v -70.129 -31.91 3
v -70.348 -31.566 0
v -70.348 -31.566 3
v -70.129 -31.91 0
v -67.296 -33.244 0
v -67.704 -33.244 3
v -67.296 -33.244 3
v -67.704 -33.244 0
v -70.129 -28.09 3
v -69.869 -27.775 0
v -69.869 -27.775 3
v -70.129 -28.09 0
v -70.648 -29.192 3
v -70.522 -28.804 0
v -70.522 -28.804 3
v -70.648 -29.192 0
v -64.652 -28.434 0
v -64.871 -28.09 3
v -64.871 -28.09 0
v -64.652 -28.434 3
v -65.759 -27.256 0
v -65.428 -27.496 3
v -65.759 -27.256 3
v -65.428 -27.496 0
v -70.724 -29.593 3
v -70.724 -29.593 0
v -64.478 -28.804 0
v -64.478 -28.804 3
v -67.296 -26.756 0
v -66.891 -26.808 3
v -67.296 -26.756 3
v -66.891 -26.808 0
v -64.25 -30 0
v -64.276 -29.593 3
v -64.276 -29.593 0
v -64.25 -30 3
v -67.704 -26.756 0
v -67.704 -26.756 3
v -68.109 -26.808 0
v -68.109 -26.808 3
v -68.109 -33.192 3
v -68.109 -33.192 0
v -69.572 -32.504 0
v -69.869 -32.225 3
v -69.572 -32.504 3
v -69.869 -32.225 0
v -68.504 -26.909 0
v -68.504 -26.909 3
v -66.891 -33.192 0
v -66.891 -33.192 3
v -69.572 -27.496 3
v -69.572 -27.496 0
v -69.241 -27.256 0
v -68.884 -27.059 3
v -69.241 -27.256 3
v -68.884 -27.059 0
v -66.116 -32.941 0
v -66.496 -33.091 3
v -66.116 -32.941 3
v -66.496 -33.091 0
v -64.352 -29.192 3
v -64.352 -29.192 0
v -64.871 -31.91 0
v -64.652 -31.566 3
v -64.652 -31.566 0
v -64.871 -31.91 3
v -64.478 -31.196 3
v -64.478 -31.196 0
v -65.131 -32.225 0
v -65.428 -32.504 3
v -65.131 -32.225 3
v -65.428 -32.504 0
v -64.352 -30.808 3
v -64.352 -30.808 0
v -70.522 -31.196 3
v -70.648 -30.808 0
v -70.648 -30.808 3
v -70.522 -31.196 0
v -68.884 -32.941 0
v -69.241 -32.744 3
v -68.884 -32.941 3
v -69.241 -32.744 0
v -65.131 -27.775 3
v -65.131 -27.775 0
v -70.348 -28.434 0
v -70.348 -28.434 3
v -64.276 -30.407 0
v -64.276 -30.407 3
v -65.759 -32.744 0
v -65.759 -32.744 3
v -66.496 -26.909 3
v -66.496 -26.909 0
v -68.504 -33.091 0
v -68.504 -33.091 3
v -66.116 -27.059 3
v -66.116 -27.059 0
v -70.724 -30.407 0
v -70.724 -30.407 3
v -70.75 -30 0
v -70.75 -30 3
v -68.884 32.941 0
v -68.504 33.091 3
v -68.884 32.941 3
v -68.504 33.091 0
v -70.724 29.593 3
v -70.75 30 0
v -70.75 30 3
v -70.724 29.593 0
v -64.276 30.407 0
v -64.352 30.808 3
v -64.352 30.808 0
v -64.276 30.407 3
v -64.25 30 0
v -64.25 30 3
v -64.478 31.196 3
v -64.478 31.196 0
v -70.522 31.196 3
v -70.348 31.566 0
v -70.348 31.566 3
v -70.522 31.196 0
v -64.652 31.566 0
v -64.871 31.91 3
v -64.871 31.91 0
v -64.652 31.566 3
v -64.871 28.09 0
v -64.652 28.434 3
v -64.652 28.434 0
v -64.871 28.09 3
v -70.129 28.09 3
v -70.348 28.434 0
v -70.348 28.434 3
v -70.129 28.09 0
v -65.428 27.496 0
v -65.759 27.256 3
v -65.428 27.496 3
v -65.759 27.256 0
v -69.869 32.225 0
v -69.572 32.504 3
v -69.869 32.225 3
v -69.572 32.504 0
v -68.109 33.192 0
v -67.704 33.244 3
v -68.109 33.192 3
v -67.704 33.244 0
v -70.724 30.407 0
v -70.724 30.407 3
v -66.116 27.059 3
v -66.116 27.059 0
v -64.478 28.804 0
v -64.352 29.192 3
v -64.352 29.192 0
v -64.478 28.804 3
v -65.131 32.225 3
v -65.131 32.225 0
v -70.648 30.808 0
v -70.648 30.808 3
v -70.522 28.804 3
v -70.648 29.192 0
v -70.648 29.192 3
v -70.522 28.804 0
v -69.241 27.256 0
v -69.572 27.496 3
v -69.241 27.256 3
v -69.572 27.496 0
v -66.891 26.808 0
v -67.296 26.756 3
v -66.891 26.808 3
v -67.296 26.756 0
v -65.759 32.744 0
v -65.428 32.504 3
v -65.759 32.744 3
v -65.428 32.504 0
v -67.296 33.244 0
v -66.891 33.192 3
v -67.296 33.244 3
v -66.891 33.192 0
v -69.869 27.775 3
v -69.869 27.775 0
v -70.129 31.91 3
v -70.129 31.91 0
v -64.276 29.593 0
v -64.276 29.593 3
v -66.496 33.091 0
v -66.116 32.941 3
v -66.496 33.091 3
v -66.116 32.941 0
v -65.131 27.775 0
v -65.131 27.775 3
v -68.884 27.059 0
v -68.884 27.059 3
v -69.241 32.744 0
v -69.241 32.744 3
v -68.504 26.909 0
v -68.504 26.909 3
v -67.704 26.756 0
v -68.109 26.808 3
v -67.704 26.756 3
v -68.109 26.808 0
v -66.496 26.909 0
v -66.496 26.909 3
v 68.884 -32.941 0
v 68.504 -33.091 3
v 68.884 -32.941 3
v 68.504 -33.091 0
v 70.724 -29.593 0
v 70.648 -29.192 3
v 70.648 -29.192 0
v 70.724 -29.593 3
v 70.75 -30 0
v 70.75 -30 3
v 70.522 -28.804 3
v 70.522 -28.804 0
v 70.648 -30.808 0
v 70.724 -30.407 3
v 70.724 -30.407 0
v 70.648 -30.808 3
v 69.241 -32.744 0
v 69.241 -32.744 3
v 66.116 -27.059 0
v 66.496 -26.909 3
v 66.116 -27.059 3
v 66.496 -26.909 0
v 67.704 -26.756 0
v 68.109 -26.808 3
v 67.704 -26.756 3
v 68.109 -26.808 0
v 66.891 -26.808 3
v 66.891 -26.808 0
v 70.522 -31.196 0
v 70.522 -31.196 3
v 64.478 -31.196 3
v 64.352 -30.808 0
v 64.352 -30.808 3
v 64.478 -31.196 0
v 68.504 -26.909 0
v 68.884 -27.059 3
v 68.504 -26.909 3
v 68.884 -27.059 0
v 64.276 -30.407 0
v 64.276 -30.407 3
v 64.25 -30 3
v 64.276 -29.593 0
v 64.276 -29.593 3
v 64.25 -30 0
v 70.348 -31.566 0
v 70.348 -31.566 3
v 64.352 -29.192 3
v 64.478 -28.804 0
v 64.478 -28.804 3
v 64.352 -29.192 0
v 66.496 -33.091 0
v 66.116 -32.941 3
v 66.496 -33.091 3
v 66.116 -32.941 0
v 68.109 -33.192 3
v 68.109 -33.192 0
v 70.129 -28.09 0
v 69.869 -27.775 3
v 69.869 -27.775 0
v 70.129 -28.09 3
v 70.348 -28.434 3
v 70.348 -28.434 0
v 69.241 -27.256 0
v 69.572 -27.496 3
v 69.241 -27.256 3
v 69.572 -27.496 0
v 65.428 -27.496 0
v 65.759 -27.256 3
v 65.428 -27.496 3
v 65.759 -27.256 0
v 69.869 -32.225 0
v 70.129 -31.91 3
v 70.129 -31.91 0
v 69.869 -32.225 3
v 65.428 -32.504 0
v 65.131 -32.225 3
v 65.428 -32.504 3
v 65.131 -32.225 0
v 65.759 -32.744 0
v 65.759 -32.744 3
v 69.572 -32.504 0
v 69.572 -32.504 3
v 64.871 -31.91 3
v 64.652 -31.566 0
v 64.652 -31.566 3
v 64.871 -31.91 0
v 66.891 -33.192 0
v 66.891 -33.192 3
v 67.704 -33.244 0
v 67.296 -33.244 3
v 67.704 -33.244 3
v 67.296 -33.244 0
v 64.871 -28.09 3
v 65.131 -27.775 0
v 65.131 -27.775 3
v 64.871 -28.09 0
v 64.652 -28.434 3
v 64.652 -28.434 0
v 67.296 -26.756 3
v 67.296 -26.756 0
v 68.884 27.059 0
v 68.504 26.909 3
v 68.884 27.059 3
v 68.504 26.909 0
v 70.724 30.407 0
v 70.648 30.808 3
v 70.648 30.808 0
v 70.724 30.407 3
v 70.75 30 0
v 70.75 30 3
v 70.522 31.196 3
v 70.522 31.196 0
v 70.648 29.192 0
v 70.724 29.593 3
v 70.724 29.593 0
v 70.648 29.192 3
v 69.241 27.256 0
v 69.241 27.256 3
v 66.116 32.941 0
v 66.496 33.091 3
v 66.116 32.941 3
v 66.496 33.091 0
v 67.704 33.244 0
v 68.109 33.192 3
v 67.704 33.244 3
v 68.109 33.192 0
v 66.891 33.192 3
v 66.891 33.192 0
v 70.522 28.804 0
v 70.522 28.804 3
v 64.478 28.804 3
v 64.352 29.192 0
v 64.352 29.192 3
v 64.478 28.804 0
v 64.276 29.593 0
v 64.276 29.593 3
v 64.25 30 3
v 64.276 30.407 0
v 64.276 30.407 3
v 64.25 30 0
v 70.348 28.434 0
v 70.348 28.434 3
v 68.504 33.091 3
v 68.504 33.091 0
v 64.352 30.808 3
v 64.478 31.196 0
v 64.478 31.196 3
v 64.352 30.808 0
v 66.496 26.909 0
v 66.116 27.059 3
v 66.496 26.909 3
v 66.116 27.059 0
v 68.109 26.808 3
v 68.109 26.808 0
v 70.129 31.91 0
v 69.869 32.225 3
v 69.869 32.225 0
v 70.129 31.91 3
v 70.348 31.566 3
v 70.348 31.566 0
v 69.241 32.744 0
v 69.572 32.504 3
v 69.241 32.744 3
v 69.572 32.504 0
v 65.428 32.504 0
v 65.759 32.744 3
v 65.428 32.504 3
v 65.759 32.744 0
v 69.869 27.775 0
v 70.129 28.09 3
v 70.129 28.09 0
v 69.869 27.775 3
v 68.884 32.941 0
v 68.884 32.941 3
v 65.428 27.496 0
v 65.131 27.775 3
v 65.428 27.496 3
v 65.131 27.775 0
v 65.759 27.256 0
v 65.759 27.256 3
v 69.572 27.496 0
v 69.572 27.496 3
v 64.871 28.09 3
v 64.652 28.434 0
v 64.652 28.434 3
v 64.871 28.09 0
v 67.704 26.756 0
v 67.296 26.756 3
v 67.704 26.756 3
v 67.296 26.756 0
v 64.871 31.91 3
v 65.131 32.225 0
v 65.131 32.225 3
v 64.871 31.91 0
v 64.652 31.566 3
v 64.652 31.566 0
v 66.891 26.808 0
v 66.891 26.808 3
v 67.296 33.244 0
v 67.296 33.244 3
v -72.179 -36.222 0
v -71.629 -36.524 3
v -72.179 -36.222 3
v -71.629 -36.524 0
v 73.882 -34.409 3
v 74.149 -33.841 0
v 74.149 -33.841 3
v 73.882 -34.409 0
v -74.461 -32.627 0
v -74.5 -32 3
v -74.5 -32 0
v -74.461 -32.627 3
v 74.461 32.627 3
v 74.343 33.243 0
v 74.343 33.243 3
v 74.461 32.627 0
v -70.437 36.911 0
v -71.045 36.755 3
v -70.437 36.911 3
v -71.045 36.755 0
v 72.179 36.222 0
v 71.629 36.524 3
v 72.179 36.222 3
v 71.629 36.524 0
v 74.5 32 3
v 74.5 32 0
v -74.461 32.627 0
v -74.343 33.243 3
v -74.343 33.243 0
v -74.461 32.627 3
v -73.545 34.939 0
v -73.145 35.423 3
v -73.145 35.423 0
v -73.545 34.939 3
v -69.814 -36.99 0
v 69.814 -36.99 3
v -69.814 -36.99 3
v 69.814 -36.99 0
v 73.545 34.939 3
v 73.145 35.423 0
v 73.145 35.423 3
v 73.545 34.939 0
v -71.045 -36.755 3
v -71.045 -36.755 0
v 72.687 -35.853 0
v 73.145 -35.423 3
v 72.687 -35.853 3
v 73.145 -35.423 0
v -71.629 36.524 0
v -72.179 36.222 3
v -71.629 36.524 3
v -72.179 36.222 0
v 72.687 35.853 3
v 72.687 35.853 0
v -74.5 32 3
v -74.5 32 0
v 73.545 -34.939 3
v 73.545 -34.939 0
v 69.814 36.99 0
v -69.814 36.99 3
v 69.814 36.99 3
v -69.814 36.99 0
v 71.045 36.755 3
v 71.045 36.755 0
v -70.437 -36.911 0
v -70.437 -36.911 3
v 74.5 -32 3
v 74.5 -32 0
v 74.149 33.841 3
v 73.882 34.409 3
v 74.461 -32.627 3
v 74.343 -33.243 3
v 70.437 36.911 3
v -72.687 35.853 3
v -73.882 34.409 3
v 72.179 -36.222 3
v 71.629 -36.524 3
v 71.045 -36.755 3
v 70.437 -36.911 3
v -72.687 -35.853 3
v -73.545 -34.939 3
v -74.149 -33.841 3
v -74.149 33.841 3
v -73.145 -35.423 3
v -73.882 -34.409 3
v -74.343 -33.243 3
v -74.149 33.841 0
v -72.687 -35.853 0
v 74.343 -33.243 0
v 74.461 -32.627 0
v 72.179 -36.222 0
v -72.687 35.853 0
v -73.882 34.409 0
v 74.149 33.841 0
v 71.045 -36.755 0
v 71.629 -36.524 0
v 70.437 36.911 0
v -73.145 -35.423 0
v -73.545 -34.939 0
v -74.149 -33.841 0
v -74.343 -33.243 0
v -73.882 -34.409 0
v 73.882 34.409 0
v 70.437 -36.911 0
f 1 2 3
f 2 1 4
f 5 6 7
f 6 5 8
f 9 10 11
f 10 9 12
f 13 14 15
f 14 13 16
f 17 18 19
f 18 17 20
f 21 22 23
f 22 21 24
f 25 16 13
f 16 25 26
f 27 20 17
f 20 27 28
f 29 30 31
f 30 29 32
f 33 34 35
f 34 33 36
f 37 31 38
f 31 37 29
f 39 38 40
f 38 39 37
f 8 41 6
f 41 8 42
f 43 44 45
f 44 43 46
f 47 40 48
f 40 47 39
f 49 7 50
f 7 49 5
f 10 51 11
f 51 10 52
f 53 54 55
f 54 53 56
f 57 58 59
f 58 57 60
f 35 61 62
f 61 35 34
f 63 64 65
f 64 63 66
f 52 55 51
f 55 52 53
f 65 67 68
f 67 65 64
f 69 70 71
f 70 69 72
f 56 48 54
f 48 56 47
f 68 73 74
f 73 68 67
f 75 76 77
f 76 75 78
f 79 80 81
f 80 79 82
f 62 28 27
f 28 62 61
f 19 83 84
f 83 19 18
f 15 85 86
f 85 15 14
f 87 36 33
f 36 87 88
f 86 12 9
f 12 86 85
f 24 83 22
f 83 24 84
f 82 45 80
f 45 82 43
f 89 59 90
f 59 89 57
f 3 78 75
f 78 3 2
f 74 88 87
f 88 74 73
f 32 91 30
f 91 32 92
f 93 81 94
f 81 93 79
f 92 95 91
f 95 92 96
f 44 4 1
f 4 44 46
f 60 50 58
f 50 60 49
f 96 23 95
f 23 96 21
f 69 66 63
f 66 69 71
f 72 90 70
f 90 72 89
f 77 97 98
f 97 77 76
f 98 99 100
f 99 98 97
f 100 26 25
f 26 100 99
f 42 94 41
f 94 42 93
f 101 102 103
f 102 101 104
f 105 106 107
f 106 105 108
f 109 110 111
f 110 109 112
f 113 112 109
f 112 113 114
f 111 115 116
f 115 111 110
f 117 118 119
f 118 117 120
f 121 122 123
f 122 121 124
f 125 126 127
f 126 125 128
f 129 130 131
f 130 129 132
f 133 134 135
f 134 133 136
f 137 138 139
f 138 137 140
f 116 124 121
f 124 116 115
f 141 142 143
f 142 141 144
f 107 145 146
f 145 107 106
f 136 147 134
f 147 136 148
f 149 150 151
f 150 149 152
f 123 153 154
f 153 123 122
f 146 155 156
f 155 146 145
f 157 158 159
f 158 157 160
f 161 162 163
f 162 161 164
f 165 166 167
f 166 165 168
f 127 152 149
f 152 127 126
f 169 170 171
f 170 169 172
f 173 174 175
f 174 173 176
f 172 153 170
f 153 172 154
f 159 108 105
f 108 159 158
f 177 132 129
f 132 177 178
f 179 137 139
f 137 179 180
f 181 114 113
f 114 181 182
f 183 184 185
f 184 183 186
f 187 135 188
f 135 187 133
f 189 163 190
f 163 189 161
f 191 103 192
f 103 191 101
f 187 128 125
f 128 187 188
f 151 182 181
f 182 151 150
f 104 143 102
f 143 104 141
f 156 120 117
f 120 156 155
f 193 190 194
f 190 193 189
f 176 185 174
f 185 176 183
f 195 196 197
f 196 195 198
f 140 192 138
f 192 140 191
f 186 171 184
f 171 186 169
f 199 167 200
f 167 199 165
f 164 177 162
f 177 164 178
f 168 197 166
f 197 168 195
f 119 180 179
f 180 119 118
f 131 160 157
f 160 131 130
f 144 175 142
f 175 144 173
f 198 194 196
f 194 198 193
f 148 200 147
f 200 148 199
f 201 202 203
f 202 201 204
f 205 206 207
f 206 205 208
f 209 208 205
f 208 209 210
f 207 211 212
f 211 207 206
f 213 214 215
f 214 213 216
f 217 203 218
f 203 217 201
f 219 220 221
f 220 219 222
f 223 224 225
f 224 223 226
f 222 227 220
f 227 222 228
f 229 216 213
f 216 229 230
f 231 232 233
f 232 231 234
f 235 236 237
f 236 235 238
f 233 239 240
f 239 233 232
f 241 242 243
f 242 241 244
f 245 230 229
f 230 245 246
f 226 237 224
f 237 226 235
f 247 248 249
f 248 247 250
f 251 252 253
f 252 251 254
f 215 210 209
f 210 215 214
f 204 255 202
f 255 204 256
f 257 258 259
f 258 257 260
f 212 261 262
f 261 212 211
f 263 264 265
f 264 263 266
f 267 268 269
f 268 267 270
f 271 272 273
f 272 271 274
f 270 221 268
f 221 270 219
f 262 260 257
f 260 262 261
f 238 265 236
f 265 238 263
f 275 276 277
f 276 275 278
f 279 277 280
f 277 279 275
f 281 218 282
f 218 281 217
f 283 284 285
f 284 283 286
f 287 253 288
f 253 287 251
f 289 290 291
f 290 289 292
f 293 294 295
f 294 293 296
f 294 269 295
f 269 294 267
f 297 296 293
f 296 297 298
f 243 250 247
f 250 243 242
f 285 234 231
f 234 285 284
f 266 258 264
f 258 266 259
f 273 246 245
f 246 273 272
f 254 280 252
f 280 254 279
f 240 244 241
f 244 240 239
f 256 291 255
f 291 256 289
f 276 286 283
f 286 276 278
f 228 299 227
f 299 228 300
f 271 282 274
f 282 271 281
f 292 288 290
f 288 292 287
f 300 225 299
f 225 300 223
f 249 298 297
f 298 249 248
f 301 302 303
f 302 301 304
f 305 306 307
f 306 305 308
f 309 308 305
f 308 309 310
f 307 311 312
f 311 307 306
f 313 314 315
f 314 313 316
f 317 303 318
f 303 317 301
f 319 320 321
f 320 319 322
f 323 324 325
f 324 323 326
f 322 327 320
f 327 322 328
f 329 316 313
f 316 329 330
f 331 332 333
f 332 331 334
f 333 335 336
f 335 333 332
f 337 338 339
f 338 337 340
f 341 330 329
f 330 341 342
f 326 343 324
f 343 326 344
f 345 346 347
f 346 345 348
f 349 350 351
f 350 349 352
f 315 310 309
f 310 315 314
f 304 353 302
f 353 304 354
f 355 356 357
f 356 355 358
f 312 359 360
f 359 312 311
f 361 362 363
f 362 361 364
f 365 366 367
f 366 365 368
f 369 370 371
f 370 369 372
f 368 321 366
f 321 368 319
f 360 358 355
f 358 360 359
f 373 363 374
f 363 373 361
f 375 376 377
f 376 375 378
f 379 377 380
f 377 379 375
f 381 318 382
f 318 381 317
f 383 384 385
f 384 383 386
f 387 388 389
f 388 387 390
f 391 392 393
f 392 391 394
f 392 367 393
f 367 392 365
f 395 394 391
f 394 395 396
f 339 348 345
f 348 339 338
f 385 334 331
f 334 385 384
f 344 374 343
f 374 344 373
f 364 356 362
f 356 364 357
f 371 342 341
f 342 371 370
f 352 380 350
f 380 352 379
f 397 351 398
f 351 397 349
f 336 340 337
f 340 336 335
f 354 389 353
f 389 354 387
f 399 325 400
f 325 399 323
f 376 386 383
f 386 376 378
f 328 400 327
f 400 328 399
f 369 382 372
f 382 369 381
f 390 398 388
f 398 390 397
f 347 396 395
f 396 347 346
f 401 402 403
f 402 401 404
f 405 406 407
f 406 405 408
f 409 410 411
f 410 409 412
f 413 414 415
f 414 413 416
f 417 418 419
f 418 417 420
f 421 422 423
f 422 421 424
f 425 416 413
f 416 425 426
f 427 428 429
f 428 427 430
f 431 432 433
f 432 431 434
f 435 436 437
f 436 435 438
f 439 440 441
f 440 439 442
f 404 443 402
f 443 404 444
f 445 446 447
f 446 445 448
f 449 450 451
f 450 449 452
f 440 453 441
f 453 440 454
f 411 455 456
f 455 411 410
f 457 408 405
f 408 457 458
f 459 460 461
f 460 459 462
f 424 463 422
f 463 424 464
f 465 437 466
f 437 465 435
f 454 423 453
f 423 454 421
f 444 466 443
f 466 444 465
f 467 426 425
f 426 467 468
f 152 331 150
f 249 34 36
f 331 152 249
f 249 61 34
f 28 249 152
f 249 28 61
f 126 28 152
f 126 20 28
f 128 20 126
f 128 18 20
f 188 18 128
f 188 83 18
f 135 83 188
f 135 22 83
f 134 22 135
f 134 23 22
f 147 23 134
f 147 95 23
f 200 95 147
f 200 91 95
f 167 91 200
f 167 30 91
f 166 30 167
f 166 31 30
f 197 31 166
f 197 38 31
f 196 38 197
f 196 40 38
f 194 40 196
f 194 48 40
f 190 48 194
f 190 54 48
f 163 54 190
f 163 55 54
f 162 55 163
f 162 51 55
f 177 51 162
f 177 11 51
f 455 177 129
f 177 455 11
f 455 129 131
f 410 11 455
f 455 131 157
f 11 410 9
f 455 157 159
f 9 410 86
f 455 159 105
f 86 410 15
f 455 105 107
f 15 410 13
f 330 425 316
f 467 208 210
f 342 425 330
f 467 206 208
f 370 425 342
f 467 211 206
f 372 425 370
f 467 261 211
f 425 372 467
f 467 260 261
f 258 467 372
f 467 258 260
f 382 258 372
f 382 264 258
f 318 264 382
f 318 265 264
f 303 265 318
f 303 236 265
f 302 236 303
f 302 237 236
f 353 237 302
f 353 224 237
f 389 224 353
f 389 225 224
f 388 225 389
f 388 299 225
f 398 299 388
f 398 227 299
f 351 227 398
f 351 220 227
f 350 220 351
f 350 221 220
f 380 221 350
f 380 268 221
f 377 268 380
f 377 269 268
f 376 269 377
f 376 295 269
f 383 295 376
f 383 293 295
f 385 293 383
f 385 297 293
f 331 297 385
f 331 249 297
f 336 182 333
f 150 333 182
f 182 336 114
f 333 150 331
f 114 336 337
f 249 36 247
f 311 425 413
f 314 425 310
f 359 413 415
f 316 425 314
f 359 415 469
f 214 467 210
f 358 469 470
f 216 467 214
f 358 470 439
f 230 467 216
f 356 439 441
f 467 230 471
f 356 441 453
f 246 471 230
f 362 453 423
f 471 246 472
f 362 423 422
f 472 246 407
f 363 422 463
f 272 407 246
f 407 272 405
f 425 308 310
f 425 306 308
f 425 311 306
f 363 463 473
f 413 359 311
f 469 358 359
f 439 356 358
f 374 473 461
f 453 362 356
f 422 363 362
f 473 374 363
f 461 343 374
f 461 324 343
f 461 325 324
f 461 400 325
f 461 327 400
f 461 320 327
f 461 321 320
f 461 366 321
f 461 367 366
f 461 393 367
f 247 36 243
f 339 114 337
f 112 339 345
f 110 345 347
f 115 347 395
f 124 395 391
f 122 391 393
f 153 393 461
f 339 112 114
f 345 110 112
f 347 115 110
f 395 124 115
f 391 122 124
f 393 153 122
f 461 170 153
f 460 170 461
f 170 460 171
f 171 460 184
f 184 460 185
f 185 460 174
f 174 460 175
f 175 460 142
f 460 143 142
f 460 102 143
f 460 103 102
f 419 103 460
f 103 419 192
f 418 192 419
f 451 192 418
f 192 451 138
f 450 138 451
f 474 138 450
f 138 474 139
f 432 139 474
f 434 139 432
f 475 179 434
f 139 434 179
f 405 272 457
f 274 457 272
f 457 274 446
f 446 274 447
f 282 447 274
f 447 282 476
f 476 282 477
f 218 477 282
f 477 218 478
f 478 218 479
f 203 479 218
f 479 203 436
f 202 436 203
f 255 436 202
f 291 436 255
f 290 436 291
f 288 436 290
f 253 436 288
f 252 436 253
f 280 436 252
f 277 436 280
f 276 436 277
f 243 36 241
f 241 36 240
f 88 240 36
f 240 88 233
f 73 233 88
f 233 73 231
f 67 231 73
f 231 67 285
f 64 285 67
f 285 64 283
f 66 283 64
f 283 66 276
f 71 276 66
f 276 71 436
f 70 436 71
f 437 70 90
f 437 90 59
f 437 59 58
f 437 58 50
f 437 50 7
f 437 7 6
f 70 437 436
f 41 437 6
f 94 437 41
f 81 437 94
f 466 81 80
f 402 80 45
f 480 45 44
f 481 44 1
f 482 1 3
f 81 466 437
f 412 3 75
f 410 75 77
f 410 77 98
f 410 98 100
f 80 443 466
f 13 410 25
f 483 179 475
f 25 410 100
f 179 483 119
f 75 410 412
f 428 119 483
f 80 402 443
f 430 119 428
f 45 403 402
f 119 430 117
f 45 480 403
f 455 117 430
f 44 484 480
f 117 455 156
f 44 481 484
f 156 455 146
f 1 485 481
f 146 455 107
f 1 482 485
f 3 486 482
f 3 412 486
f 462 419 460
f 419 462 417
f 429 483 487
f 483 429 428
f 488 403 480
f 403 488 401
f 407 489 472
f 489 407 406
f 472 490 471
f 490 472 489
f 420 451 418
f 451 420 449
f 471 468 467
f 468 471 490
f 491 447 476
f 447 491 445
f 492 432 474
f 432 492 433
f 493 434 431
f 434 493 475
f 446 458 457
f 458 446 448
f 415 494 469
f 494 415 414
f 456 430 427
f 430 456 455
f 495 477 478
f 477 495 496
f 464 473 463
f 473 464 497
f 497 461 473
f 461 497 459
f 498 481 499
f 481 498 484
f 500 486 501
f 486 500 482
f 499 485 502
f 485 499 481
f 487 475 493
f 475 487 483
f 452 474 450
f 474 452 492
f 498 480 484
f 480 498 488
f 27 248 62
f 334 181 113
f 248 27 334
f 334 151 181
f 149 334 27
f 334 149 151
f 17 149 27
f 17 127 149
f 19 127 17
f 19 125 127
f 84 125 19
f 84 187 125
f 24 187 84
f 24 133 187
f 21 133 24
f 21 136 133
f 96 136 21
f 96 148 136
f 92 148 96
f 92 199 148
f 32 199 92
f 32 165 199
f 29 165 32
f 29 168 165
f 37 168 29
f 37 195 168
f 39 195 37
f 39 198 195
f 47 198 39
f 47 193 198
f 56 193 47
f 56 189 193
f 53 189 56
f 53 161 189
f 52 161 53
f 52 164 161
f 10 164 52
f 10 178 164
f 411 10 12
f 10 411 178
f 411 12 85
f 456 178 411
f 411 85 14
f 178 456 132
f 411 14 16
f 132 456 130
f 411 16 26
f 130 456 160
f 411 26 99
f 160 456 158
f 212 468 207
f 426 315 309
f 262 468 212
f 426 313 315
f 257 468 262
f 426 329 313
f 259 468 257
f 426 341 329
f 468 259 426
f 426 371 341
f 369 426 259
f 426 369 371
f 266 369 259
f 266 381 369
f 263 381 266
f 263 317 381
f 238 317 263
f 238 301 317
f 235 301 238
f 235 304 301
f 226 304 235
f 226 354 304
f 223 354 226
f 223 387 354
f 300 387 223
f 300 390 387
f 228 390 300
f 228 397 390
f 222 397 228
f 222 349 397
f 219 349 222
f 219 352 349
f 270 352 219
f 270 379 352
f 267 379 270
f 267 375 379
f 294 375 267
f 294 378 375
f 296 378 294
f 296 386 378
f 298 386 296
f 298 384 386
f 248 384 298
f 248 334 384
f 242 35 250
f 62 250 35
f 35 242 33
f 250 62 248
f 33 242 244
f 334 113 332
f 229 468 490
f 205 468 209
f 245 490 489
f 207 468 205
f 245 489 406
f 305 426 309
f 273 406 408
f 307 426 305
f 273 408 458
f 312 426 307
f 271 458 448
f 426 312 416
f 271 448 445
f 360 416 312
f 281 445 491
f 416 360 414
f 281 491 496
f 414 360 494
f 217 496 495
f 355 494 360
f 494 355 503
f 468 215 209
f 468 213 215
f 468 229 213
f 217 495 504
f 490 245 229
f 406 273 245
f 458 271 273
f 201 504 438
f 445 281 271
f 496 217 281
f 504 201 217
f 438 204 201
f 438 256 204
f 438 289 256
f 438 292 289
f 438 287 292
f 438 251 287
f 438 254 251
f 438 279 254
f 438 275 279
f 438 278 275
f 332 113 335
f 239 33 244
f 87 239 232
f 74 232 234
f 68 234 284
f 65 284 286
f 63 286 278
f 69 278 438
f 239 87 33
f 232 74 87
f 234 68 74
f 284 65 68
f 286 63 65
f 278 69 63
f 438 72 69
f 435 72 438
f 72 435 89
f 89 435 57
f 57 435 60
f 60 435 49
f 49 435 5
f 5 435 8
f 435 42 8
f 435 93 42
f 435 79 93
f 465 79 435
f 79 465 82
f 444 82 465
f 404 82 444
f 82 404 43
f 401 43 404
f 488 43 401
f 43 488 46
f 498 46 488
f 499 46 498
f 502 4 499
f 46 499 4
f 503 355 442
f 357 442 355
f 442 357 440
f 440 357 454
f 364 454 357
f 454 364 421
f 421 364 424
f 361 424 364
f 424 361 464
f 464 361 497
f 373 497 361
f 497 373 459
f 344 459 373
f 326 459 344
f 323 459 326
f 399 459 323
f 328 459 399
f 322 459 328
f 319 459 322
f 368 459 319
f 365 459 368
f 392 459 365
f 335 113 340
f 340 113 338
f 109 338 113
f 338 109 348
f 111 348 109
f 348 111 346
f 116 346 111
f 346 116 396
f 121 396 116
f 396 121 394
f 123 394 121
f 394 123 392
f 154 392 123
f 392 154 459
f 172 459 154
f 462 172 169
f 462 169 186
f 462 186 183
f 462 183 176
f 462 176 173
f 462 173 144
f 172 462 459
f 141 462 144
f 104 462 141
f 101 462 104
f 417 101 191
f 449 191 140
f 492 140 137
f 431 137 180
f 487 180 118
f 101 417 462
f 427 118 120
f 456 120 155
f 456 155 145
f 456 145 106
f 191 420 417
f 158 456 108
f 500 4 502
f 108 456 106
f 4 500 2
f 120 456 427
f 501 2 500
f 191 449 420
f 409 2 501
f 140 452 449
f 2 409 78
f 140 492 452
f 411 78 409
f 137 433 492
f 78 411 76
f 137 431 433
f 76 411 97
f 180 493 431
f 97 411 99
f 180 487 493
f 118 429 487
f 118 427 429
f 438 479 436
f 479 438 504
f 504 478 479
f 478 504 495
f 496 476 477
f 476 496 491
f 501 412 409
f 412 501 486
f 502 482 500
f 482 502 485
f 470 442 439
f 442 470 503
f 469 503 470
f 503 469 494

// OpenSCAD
$fn = 50;


difference() {
	union() {
		hull() {
			translate(v = [-69.5000000000, 32.0000000000, 0]) {
				cylinder(h = 3, r = 5);
			}
			translate(v = [69.5000000000, 32.0000000000, 0]) {
				cylinder(h = 3, r = 5);
			}
			translate(v = [-69.5000000000, -32.0000000000, 0]) {
				cylinder(h = 3, r = 5);
			}
			translate(v = [69.5000000000, -32.0000000000, 0]) {
				cylinder(h = 3, r = 5);
			}
		}
	}
	union() {
		translate(v = [-67.5000000000, -30.0000000000, -100.0000000000]) {
			cylinder(h = 200, r = 3.2500000000);
		}
		translate(v = [-67.5000000000, 30.0000000000, -100.0000000000]) {
			cylinder(h = 200, r = 3.2500000000);
		}
		translate(v = [67.5000000000, -30.0000000000, -100.0000000000]) {
			cylinder(h = 200, r = 3.2500000000);
		}
		translate(v = [67.5000000000, 30.0000000000, -100.0000000000]) {
			cylinder(h = 200, r = 3.2500000000);
		}
	}
}
